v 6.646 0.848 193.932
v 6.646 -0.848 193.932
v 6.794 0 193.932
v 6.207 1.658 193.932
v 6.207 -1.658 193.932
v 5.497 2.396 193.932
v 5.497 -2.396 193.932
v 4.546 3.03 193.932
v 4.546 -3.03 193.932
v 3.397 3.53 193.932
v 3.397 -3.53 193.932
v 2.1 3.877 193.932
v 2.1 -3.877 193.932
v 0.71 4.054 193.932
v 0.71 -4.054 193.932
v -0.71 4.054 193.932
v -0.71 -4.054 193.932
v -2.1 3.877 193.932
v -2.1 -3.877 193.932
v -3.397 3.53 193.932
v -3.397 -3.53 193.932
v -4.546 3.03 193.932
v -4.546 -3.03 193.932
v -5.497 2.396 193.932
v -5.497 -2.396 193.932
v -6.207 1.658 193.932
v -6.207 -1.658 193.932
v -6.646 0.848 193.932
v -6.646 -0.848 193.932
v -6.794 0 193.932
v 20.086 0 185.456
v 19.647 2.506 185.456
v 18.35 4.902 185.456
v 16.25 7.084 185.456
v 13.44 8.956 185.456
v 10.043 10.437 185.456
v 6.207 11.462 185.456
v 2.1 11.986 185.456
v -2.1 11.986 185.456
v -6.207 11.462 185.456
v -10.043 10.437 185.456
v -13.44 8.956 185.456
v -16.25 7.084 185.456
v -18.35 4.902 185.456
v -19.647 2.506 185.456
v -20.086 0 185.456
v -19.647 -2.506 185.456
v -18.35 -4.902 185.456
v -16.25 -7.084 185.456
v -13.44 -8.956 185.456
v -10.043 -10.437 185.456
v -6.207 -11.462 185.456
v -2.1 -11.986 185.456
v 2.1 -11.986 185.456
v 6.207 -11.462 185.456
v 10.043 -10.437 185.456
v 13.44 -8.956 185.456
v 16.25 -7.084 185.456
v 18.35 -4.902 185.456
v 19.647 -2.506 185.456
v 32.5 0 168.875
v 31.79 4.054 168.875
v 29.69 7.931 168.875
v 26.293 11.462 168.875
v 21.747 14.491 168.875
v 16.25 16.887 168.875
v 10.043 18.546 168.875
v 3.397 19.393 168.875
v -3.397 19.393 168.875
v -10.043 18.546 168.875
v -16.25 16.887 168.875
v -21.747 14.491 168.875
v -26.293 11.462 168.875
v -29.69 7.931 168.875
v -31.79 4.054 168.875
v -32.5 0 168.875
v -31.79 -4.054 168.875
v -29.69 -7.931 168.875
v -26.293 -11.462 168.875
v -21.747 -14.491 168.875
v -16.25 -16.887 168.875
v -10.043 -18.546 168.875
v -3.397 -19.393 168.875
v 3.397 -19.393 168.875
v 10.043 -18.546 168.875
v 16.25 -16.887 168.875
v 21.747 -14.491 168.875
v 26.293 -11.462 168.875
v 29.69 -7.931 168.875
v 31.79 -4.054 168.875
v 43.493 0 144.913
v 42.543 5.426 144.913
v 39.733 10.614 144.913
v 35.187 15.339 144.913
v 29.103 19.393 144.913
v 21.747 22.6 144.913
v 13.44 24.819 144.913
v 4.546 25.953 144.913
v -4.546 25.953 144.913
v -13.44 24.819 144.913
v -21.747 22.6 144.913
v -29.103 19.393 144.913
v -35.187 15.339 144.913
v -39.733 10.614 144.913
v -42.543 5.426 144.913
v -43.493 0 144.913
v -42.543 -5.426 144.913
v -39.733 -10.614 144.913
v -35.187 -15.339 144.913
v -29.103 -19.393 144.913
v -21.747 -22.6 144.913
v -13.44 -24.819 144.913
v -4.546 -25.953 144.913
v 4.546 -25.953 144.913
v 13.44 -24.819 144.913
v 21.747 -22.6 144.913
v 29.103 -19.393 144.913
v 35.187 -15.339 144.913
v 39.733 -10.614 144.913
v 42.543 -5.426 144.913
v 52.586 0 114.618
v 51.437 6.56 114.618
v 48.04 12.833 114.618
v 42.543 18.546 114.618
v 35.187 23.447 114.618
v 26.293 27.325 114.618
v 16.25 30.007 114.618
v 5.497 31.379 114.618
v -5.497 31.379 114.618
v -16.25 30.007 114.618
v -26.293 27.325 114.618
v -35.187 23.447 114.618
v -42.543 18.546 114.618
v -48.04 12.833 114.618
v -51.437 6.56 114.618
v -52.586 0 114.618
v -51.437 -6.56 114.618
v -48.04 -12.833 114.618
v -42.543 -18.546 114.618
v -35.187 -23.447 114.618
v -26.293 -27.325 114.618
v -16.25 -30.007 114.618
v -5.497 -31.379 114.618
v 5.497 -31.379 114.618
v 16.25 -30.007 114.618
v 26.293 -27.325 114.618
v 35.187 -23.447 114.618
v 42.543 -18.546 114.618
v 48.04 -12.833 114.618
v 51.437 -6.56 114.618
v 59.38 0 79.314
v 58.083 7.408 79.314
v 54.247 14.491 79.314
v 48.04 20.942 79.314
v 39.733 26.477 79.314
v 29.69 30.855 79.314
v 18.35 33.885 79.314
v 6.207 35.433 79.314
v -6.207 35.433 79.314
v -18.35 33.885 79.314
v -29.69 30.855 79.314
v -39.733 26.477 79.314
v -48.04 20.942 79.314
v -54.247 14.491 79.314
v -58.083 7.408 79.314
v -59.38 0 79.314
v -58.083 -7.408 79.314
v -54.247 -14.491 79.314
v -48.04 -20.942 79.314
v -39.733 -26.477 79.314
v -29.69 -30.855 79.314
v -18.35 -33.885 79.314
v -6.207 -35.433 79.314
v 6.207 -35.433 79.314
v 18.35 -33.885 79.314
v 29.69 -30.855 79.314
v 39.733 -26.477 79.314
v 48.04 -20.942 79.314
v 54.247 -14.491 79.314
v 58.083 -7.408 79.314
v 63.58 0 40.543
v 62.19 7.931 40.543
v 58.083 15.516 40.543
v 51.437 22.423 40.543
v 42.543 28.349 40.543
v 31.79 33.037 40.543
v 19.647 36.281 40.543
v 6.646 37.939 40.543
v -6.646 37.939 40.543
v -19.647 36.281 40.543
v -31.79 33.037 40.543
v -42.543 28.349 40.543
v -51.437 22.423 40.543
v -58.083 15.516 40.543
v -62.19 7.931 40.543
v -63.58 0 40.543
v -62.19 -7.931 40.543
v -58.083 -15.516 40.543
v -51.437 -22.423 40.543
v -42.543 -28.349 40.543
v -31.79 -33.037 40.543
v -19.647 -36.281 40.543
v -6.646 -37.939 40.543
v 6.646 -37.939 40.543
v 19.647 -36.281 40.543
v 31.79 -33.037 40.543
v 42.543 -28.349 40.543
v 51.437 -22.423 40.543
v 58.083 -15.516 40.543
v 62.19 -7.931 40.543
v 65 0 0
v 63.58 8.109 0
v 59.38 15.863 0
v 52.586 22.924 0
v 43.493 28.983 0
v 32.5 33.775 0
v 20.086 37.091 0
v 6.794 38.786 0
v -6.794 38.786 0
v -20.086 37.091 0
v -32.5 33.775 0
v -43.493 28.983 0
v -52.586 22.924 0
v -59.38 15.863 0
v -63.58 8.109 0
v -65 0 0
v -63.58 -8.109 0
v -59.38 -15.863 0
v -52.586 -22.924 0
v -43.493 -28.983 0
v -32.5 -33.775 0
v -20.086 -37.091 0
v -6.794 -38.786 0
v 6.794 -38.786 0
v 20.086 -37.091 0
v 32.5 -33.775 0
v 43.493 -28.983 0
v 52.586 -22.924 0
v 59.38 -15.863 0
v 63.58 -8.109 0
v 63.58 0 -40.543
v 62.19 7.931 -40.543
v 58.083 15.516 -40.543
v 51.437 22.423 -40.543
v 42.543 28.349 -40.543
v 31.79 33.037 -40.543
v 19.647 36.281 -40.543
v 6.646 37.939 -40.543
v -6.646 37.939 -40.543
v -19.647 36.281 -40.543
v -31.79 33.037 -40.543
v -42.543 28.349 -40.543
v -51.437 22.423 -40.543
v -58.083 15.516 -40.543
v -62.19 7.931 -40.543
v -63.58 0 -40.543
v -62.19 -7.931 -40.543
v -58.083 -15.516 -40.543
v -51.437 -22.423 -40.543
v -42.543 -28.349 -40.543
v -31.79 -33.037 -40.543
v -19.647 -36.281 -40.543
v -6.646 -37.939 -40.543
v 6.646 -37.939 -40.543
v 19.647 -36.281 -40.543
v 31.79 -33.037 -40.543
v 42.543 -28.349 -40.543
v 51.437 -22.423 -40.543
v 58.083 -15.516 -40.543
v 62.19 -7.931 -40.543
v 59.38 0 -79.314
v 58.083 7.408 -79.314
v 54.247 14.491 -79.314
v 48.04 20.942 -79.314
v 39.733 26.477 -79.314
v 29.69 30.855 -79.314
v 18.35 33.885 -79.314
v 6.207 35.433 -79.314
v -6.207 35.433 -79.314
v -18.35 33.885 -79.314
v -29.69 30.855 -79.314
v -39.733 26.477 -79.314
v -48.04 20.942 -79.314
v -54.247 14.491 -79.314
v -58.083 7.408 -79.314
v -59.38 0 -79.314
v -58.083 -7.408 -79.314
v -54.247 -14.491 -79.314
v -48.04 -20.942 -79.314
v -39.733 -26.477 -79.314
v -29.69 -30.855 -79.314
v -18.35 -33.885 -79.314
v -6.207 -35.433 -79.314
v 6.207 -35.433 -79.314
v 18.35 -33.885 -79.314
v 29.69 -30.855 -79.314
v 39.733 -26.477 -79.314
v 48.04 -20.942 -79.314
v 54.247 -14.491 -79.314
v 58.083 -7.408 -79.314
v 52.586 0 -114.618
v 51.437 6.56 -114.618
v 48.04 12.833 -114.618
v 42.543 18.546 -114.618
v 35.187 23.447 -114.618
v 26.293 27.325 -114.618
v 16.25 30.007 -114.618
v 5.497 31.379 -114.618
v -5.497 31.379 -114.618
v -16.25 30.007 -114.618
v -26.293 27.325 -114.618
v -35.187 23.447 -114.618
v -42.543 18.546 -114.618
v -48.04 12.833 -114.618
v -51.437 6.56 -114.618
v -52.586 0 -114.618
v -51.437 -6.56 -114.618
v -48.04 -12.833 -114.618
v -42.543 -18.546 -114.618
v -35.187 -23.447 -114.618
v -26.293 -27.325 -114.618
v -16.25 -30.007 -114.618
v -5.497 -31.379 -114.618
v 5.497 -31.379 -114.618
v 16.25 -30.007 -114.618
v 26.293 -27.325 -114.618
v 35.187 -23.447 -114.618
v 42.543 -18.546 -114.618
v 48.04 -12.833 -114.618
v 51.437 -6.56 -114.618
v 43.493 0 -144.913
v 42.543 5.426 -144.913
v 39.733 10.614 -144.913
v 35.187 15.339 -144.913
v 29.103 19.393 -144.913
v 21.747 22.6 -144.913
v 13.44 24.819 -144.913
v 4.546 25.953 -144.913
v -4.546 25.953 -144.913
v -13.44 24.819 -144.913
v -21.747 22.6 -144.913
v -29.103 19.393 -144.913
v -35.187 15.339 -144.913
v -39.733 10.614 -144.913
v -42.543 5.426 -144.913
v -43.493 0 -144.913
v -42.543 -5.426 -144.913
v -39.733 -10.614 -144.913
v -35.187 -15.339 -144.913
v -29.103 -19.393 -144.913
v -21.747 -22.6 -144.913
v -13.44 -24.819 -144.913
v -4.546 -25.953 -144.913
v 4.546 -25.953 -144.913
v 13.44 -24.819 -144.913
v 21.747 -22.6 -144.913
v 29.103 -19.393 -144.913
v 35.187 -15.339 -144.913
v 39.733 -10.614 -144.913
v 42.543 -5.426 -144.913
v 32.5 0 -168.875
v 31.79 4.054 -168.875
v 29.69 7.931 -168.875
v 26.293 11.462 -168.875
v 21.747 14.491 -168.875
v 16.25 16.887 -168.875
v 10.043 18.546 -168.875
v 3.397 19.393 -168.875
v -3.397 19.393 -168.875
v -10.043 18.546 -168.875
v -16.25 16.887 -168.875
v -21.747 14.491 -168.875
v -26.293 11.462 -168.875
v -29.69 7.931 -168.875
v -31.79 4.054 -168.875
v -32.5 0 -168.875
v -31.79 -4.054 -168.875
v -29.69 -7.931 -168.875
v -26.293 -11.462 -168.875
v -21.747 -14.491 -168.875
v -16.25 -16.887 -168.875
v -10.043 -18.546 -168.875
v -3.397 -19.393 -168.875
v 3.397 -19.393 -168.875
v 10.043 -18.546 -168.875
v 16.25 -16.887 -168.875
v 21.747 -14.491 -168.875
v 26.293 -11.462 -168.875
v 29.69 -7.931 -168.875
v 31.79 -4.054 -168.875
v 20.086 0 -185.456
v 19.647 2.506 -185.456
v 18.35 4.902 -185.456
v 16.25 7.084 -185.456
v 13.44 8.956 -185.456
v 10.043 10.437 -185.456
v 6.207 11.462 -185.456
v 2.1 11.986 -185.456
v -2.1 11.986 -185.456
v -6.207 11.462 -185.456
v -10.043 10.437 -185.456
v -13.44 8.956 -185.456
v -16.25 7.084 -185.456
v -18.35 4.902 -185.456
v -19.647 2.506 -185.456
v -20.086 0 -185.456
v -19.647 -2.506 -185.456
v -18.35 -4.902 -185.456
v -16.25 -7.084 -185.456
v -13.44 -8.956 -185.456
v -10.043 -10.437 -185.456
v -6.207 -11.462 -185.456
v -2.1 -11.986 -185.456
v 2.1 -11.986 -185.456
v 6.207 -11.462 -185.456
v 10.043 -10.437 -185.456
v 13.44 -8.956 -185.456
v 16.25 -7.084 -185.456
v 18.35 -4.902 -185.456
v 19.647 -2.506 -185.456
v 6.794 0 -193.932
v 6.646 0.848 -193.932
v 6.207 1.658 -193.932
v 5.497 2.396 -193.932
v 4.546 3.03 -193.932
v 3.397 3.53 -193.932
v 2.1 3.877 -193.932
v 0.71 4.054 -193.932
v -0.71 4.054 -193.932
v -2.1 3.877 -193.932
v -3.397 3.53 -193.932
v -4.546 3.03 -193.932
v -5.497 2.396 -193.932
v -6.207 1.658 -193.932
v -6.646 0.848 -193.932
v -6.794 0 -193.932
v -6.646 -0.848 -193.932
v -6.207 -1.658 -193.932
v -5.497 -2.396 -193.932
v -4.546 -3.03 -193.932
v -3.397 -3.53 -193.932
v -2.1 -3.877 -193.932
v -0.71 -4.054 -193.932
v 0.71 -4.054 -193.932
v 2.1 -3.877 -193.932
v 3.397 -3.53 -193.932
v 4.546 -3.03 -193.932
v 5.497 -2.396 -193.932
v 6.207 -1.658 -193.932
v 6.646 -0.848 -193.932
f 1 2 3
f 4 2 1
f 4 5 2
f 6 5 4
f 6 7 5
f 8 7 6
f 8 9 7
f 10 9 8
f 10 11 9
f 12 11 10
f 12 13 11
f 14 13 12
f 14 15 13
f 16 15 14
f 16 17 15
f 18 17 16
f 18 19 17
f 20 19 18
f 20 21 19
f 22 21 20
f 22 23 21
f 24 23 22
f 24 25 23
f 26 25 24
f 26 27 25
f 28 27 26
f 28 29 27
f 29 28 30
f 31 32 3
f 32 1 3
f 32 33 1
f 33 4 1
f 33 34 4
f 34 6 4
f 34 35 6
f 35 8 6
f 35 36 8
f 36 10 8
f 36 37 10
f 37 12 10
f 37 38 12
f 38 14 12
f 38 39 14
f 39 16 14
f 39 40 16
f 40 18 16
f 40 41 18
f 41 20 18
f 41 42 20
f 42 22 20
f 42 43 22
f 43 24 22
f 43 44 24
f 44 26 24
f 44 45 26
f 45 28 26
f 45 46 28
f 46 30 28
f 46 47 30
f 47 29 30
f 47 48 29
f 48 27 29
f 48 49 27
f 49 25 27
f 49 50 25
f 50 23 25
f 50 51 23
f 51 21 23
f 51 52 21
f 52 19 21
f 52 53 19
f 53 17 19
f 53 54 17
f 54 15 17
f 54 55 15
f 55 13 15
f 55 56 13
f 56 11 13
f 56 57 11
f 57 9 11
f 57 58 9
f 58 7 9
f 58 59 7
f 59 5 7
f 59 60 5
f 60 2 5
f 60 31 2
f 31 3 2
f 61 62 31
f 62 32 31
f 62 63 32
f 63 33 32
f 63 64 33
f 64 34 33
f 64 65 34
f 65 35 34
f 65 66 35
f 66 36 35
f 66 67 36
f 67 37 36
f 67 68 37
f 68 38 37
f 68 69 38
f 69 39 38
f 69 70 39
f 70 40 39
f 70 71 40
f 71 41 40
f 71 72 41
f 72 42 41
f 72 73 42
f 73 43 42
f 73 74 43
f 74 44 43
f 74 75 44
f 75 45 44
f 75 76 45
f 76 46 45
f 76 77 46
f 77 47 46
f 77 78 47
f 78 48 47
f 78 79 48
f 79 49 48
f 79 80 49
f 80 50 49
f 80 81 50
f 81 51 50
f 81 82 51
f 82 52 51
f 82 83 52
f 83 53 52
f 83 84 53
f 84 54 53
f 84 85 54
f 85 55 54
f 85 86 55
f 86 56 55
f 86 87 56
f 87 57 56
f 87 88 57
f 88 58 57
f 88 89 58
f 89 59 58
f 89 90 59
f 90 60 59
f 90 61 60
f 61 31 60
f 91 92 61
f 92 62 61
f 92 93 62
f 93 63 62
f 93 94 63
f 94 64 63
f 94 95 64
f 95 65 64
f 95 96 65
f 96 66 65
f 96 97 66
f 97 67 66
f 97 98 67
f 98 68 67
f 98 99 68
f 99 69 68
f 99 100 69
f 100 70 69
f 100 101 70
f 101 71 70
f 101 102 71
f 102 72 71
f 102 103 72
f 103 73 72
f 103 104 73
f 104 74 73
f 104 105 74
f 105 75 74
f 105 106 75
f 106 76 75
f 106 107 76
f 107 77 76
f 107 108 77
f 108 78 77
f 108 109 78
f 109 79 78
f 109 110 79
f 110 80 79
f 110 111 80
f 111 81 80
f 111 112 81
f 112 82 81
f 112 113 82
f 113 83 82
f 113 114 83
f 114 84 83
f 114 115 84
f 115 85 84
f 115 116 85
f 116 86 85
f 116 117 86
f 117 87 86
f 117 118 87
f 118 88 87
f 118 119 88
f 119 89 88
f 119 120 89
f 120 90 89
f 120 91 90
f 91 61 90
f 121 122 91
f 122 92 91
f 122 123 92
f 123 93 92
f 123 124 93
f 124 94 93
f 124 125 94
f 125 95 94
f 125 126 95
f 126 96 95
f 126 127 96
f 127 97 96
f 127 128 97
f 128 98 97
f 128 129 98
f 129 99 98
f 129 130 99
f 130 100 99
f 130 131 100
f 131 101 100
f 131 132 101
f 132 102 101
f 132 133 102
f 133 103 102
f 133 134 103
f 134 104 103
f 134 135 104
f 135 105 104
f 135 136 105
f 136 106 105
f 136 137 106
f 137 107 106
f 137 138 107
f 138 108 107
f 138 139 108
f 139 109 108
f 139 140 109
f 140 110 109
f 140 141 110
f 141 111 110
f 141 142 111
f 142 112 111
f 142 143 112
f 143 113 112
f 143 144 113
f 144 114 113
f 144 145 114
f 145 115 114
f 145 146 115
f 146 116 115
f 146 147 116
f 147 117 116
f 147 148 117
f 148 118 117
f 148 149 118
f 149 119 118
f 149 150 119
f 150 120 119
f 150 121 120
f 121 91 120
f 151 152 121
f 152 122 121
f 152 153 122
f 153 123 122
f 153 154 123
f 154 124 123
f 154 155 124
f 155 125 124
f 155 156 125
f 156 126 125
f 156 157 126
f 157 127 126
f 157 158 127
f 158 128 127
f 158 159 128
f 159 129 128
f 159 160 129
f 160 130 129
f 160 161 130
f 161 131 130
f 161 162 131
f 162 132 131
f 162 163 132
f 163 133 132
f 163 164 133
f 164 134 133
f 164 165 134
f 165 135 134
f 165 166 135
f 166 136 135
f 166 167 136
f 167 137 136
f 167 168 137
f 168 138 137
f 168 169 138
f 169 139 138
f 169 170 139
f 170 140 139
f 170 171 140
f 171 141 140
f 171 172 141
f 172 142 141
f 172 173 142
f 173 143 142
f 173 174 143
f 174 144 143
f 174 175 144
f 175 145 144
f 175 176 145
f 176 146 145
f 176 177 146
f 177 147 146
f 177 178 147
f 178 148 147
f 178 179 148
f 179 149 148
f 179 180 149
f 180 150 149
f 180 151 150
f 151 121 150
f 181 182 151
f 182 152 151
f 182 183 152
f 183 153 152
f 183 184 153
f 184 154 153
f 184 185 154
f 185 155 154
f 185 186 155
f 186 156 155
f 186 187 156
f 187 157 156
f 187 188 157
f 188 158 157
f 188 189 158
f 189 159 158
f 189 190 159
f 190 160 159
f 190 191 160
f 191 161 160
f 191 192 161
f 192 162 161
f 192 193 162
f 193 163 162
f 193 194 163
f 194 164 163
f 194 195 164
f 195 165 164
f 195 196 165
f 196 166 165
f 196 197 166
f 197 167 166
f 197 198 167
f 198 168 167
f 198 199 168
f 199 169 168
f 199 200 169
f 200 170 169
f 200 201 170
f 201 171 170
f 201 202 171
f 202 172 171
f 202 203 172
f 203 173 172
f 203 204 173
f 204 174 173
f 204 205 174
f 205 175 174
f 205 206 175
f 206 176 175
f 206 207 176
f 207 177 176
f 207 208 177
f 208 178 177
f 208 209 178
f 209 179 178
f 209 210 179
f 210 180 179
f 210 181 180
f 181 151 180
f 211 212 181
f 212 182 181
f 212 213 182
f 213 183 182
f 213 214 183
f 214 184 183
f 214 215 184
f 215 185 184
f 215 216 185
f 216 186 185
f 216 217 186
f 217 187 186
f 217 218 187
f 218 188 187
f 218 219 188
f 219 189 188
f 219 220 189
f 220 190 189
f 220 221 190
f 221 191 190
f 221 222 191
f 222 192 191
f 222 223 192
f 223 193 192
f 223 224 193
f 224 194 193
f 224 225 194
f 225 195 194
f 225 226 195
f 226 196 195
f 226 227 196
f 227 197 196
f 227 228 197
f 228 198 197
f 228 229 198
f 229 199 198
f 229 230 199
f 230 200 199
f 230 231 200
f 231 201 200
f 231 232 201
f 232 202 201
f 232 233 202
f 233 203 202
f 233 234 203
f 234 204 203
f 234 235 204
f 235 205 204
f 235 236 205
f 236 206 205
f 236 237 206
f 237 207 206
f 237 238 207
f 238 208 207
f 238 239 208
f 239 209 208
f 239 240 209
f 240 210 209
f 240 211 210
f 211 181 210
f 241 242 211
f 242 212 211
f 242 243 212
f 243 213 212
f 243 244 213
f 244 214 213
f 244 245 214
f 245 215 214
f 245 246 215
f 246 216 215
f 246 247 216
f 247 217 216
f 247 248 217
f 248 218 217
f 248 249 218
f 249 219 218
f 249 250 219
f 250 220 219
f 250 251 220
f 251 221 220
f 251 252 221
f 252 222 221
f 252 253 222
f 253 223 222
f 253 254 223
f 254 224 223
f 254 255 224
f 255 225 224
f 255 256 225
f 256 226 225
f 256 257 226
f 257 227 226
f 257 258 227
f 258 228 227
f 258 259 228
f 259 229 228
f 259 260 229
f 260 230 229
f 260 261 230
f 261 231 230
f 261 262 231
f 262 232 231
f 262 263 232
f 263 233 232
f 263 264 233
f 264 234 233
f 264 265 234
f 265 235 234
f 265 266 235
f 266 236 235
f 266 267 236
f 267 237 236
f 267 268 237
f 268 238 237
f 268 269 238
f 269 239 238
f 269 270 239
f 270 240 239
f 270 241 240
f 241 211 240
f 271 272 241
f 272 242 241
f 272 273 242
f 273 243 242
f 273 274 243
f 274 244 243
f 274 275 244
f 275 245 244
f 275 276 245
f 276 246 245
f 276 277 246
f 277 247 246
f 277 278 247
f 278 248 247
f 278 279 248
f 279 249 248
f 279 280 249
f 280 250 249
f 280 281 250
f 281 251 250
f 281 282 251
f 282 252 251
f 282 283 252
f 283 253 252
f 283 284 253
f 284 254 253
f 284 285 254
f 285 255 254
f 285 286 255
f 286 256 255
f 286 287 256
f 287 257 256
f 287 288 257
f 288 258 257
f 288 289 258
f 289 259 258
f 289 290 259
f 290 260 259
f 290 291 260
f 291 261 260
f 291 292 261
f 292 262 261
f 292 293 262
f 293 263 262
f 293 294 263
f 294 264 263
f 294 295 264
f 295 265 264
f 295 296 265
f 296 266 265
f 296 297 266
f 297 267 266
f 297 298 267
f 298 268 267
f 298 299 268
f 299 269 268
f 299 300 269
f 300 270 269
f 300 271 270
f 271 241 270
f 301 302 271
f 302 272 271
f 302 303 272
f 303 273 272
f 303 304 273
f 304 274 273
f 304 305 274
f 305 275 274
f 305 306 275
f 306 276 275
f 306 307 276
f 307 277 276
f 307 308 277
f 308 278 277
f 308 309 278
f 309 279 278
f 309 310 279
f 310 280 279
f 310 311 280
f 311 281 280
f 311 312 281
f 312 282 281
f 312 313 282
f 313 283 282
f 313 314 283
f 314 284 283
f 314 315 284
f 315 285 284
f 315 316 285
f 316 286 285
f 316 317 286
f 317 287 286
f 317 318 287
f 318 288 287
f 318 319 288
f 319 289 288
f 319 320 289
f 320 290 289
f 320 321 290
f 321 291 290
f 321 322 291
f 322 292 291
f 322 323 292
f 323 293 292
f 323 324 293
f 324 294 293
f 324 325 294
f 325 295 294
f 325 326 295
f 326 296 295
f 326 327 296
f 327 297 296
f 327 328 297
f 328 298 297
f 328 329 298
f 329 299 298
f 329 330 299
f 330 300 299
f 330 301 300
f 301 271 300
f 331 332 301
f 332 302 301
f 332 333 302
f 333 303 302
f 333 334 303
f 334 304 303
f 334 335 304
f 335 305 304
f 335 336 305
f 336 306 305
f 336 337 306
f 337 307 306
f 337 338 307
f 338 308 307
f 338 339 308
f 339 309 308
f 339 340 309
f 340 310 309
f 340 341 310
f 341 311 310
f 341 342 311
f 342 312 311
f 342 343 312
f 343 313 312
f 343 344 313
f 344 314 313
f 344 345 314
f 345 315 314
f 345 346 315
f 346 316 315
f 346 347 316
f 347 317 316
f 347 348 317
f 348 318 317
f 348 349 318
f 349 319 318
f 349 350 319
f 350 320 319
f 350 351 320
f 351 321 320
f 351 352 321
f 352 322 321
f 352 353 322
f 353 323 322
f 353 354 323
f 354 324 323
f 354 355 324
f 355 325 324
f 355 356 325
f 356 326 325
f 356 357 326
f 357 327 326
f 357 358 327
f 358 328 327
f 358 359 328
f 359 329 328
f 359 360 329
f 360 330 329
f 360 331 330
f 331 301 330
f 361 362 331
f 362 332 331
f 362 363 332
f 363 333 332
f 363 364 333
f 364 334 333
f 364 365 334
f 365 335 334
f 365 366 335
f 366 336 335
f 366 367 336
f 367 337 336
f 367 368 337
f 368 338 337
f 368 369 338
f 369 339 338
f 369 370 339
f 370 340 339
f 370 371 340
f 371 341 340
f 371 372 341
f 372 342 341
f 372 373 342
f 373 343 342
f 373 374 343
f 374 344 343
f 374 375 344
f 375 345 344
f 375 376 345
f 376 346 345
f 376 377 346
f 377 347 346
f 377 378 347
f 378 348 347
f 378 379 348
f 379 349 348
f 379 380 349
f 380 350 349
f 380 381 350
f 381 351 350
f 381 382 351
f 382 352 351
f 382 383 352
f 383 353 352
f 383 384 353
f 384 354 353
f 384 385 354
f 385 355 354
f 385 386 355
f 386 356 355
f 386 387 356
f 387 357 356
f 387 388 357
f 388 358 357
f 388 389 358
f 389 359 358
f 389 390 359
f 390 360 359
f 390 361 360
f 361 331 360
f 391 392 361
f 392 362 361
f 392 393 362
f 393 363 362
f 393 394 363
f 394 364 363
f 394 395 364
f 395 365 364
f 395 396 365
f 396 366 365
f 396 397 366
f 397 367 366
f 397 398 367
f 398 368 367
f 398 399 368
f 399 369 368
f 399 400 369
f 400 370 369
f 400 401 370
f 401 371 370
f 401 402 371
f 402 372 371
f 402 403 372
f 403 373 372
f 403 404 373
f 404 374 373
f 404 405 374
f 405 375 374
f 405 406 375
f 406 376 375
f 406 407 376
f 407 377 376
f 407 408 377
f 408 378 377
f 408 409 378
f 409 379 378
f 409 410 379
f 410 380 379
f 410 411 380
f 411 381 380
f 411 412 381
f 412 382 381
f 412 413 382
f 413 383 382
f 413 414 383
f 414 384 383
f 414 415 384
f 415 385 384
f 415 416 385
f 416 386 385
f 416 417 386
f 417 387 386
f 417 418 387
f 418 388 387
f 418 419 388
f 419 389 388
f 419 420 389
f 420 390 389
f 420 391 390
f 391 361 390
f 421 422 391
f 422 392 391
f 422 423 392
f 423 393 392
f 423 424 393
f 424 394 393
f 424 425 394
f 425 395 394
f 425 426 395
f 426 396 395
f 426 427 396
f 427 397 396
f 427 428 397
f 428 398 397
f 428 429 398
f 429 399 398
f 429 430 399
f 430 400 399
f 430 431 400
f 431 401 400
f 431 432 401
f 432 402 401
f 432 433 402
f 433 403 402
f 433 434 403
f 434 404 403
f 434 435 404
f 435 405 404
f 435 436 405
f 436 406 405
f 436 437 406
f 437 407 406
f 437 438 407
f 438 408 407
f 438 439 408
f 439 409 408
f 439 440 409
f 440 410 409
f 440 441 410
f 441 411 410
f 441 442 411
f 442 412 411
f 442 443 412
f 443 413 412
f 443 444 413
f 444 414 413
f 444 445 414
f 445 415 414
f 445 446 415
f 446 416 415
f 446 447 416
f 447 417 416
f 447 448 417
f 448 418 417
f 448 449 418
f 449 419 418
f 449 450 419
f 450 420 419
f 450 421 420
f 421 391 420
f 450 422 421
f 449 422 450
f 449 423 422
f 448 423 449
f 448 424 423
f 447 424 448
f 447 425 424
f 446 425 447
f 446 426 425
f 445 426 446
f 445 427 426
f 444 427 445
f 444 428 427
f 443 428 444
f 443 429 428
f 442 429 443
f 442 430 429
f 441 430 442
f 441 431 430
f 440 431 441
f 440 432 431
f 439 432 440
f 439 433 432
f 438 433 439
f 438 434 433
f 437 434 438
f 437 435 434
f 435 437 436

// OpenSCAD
// Generated by SolidPython 1.0.1 on 2020-07-29 00:46:46


scale(v = [5, 3, 15]) {
	sphere(r = 13);
}
/***********************************************
*********      SolidPython code:      **********
************************************************
 
# import packages: SolidPython
from solid import *
from solid.utils import *
from itertools import chain, combinations, permutations


class Resize:

    def __init__(self, scad_file):
        self.scad_file = scad_file
        #self.scad_file = import_scad(scad_file)
        # cone/cylinder param:
        self.r1 = 0
        self.r2 = 0
        self.h = 0
        # rectangular prism param:
        self.w = 0
        self.l = 0
        # ellipse param:
        self.r = 0

    # import OpenScad code (file name corresponds to shape)


    # classify shape + parameters
    def assign(self, param1, param2, param3):
        if self.scad_file == 'cone.scad':
            self.r1 = param1
            self.r2 = param2
            self.h = param3
        elif self.scad_file == 'cylinder.scad':
            self.r1 = param1
            self.r2 = param2
            self.h = param3
        elif self.scad_file == 'rectangularPrism.scad':
            self.h = param1
            self.l = param2
            self.w = param3
        else:
            self.r = param1
            self.h = param2

    # resize parameters
    def iterate(self):
        x = range(3, 20, 2)
        i = 1
        if self.scad_file == 'cone.scad':
            tempList = list(permutations(x, 2))
            for temp in tempList:
                param1 = temp[0]
                param2 = temp[1]
                filepath = 'produced_scad_files/' + 'cone' + str(param1) + '_' + str(param2) + '_' + '.scad'
                scad_render_to_file(cylinder(h=param1, r1=param2, r2=0), filepath)

        elif self.scad_file == 'cylinder.scad':
            tempList = list(permutations(x, 3))
            for temp in tempList:
                param1 = temp[0]
                param2 = temp[1]
                filepath = 'produced_scad_files/' + 'cylinder' + str(param1) + '_' + str(param2) + '_' + '.scad'
                scad_render_to_file(cylinder(h=param1, r1=param2, r2=param2), filepath)

        elif self.scad_file == 'rectangularPrism.scad':
            tempList = list(permutations(x, 3))
            for temp in tempList:
                param1 = temp[0]
                param2 = temp[1]
                param3 = temp[2]
                filepath = 'produced_scad_files/' + 'rectangularPrism' + str(param1) + '_' + str(param2) + '_' + str(
                    param3) + '.scad'
                scad_render_to_file(cube(size=(param1, param2, param3)), filepath)

        elif self.scad_file == 'ellipse.scad':
            tempList = list(permutations(x, 4))
            for temp in tempList:
                param1 = temp[0]
                param2 = temp[1]
                param3 = temp[2]
                param4 = temp[3]
                filepath = 'produced_scad_files/' + 'ellipse' + str(param1) + '_' + str(param2) + '_' + str(param3) + '_' + str(param4) + '.scad'
                scad_render_to_file(scale([param1, param2, param3])(sphere(r=param4)), filepath)

    def render_to_scadfile(self):
        scad_render_to_file(scad, 'example.scad') 
 
************************************************/
